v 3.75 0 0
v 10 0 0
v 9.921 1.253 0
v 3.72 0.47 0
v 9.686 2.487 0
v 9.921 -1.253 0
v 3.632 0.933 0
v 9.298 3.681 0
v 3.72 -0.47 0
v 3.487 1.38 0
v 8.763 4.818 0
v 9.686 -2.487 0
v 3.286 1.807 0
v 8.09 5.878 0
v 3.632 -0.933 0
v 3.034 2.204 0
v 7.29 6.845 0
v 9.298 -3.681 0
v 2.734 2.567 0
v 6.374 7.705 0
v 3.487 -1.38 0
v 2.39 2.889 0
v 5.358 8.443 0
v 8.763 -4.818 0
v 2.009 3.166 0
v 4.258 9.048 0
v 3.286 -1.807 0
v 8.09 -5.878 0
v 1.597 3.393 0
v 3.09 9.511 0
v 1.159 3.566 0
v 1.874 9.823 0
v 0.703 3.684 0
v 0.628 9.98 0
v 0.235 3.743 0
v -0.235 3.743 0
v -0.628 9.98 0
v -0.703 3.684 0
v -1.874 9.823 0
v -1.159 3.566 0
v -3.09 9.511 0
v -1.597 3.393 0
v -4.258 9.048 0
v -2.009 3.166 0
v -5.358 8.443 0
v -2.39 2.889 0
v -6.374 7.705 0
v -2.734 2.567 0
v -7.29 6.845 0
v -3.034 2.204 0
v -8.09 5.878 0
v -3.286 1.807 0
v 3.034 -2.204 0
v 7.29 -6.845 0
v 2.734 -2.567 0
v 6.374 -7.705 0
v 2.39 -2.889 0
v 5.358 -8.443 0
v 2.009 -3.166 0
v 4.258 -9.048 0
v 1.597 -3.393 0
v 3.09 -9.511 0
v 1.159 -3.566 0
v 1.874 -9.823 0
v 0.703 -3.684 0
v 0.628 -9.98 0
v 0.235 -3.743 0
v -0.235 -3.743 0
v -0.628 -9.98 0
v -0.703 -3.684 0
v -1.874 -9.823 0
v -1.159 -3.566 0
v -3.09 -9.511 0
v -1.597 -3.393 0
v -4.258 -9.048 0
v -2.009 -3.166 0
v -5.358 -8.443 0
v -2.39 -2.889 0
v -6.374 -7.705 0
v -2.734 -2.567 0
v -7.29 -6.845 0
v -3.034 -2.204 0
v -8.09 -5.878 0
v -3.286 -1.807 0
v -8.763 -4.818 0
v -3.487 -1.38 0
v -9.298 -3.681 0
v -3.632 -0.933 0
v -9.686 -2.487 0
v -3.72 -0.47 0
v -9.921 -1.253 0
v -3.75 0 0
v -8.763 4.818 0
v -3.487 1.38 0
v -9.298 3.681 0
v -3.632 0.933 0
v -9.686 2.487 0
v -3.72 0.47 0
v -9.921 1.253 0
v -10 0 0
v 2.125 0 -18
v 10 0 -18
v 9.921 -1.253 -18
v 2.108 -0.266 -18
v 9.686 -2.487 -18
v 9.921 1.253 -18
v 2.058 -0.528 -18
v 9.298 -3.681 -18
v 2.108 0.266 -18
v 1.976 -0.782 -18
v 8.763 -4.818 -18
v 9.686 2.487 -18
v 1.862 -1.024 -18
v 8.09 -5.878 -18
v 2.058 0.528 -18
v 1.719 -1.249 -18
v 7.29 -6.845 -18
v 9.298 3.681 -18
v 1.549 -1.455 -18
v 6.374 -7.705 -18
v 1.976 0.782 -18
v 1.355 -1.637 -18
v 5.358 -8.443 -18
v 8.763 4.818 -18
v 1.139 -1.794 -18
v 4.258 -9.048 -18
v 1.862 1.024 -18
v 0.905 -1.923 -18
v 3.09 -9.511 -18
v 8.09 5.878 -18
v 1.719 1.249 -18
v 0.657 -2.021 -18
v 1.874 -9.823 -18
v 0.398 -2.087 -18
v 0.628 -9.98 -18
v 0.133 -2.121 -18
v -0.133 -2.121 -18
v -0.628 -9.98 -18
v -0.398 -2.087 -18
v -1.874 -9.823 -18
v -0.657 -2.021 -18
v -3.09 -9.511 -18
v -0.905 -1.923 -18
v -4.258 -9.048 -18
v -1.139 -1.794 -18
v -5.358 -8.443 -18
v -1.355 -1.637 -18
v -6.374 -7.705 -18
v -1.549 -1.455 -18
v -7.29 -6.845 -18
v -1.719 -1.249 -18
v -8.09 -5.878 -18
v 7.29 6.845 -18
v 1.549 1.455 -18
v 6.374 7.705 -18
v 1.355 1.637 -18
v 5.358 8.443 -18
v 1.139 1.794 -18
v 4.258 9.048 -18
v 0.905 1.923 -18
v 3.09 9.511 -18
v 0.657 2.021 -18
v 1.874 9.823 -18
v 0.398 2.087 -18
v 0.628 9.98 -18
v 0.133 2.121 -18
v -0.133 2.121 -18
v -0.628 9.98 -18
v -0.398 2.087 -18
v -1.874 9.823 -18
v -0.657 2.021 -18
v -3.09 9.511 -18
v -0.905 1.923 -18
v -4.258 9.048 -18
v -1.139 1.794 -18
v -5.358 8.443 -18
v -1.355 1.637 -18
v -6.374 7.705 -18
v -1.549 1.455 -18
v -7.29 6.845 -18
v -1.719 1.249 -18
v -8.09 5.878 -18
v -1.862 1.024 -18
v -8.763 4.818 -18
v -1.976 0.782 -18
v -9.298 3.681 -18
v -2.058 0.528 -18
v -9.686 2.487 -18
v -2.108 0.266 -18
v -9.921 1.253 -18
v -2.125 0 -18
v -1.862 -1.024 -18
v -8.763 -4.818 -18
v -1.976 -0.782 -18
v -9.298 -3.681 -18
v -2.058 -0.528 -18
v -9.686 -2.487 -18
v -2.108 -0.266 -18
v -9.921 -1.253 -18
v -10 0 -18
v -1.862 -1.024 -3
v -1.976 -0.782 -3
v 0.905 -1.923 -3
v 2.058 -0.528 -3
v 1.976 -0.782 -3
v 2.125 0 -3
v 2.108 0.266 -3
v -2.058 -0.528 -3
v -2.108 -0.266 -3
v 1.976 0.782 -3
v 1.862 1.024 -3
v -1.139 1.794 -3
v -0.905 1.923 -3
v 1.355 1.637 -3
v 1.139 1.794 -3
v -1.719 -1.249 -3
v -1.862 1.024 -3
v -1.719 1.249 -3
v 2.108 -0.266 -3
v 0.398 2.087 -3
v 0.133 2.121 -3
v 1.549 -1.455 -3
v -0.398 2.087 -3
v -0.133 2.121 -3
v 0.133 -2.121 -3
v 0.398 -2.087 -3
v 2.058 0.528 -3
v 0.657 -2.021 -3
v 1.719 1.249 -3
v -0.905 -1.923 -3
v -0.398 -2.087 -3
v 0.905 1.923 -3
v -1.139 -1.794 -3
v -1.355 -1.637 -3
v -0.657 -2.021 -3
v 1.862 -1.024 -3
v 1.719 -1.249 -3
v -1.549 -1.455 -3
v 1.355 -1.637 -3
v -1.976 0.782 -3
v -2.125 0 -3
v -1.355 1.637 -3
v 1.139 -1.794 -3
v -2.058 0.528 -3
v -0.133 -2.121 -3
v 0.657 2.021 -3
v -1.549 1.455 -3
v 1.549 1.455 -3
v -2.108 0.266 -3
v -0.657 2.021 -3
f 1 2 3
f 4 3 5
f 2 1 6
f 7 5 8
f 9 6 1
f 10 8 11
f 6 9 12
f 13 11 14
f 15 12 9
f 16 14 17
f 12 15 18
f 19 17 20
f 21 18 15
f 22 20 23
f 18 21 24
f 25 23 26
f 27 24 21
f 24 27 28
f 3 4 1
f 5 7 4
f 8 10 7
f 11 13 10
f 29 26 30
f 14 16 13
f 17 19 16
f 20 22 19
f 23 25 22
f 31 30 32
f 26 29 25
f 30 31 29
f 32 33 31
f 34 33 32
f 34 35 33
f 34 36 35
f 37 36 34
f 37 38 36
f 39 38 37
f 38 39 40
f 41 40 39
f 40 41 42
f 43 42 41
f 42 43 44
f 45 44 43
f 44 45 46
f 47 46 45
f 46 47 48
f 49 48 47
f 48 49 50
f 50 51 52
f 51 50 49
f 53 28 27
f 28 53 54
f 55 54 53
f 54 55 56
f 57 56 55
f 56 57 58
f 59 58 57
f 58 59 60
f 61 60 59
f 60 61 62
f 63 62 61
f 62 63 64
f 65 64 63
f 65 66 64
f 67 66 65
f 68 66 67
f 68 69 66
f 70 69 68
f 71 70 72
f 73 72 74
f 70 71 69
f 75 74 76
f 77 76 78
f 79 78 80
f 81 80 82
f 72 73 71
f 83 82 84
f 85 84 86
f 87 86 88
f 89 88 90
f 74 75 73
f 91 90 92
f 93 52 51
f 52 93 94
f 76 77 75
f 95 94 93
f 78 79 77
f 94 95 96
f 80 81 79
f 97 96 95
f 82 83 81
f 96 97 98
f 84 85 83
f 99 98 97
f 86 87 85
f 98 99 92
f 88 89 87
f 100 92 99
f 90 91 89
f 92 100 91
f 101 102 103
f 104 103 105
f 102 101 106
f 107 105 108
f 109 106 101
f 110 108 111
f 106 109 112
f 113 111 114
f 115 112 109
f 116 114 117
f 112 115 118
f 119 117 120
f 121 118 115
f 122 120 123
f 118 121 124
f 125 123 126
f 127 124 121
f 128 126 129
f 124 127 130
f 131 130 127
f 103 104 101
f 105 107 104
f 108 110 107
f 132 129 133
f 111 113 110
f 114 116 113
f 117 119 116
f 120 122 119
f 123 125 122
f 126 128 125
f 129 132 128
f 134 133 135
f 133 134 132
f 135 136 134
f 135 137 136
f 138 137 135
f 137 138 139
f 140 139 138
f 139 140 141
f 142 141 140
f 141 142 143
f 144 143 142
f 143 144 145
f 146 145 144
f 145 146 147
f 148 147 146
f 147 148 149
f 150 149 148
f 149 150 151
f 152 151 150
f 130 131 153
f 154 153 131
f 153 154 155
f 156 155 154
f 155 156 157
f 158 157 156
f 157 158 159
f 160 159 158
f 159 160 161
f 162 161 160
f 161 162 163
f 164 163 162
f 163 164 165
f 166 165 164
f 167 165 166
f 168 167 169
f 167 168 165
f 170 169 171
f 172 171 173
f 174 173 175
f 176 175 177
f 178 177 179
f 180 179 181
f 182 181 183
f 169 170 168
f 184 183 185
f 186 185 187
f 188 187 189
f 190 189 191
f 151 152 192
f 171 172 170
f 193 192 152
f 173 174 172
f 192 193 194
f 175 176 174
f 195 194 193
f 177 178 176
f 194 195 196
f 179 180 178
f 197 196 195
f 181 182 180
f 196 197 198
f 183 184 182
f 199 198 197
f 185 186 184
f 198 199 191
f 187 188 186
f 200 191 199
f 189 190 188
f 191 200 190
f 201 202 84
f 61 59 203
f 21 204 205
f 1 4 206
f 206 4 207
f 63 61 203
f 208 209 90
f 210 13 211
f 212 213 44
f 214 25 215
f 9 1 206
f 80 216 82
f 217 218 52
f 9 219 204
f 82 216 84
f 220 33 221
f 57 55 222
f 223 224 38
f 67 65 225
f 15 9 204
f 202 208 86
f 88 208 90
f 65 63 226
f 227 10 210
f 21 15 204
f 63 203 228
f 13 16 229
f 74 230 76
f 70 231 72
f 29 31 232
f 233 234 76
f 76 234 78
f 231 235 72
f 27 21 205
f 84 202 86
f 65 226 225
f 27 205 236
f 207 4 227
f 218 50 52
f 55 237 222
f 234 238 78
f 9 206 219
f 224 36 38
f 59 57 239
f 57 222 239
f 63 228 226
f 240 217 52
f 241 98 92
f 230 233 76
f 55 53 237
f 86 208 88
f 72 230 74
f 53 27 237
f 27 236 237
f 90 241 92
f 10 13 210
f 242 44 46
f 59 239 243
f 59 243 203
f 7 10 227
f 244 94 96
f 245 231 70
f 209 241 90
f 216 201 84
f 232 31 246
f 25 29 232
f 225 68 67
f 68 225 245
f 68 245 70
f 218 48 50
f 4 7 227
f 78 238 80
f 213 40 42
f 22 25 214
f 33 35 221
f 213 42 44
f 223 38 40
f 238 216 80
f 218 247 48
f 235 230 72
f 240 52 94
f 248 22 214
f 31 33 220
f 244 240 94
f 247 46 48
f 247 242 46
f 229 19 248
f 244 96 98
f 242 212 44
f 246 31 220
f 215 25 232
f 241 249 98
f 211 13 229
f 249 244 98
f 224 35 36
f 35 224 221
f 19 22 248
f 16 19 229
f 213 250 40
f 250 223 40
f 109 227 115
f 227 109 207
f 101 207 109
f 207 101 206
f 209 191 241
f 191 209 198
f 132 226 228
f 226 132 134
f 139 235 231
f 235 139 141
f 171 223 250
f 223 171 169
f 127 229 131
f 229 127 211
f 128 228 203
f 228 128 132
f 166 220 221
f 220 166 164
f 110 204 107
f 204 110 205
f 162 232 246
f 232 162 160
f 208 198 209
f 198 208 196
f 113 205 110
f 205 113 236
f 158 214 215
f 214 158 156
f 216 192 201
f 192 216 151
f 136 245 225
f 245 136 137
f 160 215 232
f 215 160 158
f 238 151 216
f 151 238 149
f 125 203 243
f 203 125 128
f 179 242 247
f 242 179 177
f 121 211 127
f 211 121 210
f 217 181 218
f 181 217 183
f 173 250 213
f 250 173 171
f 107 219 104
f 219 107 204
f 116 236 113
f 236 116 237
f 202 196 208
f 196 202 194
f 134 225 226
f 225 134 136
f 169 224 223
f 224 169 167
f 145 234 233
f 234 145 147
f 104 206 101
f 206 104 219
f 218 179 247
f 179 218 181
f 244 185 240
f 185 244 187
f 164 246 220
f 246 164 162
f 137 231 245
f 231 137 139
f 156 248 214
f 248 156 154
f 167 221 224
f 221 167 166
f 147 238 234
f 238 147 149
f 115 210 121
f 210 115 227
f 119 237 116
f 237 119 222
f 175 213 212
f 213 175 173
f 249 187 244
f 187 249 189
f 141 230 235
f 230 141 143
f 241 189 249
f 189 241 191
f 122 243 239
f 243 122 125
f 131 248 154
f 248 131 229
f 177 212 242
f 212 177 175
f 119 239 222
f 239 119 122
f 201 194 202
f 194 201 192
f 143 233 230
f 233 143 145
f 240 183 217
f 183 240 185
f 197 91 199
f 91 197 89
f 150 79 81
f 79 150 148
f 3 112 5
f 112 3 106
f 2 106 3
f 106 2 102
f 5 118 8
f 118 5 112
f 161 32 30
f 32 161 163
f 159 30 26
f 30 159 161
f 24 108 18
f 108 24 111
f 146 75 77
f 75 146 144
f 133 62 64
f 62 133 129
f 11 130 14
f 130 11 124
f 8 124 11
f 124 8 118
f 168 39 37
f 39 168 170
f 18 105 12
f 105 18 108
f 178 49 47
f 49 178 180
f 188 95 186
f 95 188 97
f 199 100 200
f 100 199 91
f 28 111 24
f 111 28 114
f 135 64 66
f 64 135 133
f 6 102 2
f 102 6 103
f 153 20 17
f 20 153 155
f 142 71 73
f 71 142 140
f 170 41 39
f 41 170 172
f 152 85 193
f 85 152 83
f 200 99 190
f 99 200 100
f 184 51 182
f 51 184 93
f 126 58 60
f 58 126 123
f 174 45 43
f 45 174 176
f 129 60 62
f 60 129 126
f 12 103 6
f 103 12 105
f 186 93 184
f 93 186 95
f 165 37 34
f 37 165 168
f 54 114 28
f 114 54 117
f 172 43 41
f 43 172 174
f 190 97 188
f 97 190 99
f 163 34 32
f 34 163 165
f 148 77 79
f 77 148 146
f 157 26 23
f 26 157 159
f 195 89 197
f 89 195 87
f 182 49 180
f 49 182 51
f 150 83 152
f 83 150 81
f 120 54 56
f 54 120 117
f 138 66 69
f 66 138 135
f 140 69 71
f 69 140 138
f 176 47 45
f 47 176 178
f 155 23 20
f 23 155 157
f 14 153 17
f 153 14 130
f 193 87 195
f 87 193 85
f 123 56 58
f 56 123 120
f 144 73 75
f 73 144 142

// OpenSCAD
$fn = 50;


difference() {
	union() {
		translate(v = [0, 0, -18.0000000000]) {
			cylinder(h = 18, r = 10.0000000000);
		}
		cylinder(h = 0, r = 19.0000000000);
	}
	union() {
		translate(v = [0, 0, 0]) {
			rotate(a = [0, 0, 0]) {
				difference() {
					union() {
						#translate(v = [0, 0, -18.0000000000]) {
							cylinder(h = 18, r = 2.0000000000);
						}
						#translate(v = [0, 0, -3]) {
							cylinder(h = 3, r = 10.0000000000, r1 = 2.1250000000, r2 = 3.7500000000);
						}
						#translate(v = [0, 0, -18.0000000000]) {
							cylinder(h = 18, r = 2.1250000000);
						}
						#translate(v = [0, 0, -18.0000000000]) {
							cylinder(h = 18, r = 2.0000000000);
						}
					}
					union();
				}
			}
		}
	}
}
